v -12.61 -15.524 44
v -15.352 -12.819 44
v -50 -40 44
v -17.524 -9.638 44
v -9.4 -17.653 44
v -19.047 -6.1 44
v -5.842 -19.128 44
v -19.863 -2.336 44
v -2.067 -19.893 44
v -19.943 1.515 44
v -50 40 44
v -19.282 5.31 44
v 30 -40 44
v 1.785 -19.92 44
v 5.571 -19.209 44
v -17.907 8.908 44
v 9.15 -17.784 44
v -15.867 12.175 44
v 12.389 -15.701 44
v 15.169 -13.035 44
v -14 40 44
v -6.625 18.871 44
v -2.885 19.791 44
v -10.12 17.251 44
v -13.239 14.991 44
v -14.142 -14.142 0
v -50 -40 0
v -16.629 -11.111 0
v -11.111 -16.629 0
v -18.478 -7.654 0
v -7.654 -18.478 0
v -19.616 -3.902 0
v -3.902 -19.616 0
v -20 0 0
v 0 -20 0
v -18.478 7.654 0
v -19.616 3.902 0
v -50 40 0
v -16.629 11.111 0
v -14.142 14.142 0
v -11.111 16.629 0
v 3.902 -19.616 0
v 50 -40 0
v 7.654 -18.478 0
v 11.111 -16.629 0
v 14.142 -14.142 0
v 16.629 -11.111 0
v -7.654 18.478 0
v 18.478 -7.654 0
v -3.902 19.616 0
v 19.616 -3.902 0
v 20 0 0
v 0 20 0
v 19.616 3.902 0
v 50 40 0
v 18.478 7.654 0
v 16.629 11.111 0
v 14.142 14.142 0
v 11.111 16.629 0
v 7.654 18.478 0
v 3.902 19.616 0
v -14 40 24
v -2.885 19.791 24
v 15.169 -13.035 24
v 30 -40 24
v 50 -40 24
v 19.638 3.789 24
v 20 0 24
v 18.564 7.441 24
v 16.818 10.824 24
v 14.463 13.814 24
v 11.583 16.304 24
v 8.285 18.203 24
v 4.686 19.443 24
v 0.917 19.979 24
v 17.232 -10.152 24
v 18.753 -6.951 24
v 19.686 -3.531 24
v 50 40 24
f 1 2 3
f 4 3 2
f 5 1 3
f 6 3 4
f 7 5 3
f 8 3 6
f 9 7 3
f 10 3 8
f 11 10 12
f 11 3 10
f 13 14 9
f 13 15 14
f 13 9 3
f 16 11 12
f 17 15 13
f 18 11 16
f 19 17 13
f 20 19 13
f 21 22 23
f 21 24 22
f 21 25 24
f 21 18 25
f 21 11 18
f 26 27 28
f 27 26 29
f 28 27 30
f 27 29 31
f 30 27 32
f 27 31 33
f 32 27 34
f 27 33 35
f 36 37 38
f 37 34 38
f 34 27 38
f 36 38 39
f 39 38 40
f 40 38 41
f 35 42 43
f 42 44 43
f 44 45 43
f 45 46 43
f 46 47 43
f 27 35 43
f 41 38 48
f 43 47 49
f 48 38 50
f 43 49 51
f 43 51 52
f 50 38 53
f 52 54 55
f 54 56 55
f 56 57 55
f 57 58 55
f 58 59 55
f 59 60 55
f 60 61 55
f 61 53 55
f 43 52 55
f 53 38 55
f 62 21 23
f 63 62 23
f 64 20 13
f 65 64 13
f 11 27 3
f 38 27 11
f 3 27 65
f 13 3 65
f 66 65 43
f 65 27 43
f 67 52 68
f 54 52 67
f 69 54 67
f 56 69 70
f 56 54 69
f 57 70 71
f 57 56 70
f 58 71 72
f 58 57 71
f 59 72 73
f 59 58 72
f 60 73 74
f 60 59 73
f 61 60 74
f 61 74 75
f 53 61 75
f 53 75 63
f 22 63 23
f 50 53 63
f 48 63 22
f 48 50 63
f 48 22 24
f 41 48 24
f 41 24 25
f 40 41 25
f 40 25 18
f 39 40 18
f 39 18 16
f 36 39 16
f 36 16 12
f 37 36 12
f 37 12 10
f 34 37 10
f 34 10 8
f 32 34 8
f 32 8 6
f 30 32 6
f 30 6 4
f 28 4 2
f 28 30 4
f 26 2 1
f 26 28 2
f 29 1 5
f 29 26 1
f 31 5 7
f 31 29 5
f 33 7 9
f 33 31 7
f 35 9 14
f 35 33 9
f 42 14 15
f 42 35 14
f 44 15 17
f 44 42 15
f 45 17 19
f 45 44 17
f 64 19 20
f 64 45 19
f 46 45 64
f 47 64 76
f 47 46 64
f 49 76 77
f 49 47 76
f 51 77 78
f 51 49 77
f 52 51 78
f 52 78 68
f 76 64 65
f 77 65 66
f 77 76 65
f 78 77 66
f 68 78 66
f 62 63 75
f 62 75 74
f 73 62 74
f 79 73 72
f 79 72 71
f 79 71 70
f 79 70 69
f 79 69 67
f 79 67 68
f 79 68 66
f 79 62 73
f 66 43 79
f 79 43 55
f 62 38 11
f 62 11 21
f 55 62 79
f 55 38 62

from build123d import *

# Parameters (mm, degrees)
F0_W     = 100
F0_H     = 80
F0_R     = 20
F1_DEPTH = 44
F3_DEPTH = 20


with BuildPart() as f1:
    # F0 (on Top) → F1 (new body)
    with BuildSketch(Plane.XY):
        Rectangle(F0_W, F0_H)
        Circle(F0_R, mode=Mode.SUBTRACT)
    extrude(amount=F1_DEPTH)

    # F2 (on face) → F3 (cut)
    with BuildSketch(Plane.XY.offset(44)):
        with BuildLine():
            Line((50, -40), (50, 40))
            Line((50, 40), (-14, 40))
            Line((-14, 40), (-2.8849574507, 19.7908317285))
            ThreePointArc((-2.8849574507, 19.7908317285), (13.0824472287, 15.1277749358), (20, 0))
            ThreePointArc((20, 0), (18.7534067701, -6.9505204492), (15.1690265486, -13.0345937247))
            Line((15.1690265486, -13.0345937247), (30, -40))
            Line((30, -40), (50, -40))
        make_face()
    extrude(amount=-F3_DEPTH, mode=Mode.SUBTRACT)


solid = f1.part
